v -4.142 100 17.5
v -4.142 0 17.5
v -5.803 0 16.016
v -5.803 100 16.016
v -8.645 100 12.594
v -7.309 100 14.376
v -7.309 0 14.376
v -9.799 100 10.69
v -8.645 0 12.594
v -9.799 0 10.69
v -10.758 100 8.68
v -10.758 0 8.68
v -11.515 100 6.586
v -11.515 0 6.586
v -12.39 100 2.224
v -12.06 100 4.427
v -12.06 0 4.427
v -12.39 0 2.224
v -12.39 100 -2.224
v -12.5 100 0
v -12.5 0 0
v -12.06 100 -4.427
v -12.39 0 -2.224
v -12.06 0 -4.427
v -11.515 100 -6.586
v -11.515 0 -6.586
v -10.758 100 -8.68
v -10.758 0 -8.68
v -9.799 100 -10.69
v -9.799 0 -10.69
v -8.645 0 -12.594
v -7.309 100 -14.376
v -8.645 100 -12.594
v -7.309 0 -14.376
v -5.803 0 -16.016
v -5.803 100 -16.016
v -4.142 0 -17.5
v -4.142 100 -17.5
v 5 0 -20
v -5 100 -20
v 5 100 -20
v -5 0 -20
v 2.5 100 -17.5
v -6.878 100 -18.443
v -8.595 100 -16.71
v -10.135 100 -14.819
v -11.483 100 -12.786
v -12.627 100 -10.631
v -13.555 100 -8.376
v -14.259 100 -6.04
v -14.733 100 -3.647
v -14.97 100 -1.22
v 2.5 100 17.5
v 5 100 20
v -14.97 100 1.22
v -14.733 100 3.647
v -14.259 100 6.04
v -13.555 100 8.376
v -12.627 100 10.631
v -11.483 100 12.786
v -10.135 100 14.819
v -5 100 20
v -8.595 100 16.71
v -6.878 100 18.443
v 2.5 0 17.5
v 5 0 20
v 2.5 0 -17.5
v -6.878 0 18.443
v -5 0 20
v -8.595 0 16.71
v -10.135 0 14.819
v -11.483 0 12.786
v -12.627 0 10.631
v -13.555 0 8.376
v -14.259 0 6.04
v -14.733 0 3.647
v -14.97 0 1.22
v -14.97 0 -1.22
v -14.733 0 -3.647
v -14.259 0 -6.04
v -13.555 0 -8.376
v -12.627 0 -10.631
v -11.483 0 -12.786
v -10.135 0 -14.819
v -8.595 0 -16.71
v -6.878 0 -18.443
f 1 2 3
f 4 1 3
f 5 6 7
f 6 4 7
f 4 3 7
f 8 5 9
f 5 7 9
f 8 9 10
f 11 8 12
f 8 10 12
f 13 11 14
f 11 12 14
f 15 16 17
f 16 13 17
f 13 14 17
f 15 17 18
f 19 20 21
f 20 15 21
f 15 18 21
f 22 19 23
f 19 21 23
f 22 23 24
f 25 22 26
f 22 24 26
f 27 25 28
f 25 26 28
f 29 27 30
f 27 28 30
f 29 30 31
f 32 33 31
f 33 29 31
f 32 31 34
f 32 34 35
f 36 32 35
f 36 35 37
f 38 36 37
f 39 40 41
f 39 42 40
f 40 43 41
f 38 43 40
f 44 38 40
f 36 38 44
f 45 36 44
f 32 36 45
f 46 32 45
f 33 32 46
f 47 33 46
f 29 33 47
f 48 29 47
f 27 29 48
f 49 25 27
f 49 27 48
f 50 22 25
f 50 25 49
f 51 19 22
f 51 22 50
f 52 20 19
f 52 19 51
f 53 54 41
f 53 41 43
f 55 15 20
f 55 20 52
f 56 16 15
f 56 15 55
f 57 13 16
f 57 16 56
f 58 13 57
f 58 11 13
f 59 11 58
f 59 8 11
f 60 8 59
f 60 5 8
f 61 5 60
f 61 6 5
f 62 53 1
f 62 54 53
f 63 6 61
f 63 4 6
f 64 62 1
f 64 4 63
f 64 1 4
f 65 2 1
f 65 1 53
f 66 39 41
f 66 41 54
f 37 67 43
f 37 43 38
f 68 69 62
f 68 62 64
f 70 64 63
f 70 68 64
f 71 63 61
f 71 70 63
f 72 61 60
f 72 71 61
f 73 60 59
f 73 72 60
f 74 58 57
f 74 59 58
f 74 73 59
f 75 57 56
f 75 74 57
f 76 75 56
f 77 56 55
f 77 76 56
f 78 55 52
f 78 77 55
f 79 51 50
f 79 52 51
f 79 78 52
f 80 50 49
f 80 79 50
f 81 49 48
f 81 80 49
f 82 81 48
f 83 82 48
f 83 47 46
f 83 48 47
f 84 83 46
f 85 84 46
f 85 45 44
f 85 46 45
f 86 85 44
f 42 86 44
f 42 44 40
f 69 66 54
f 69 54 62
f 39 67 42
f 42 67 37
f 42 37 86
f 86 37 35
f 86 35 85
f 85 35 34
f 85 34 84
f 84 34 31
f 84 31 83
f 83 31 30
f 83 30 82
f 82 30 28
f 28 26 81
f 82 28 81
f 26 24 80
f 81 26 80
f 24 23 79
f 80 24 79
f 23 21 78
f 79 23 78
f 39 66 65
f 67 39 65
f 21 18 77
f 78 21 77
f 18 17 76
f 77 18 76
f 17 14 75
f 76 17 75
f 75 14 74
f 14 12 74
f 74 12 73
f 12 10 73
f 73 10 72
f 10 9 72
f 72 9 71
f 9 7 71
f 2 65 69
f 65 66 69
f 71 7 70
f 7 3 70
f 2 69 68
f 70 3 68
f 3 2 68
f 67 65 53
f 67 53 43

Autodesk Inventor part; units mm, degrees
ref_plane "YZ Plane" through (0, 0, 0) normal (1, 0, 0) x (0, 1, 0)
ref_plane "XZ Plane" through (0, 0, 0) normal (0, 1, 0) x (-1, 0, 0)
ref_plane "XY Plane" through (0, 0, 0) normal (0, 0, 1) x (1, 0, 0)
sketch "Sketch1" plane through (0, 0, 0) normal (0, 1, 0) x (-1, 0, 0)
  line L0 (-5, 20) -> (5, 20)
  line L1 (5, 20) -> (5, -20) construction
  line L2 (5, -20) -> (-5, -20)
  line L3 (-5, -20) -> (-5, 20)
  line L4 (-5, 20) -> (5, -20) construction
  line L5 (5, 20) -> (-5, -20) construction
  arc A0 (5, -20) -> (5, 20) centre (-10, 0) ccw
  line L6 (-2.5, -17.5) -> (4.1421, -17.5)
  arc A1 (4.1421, -17.5) -> (4.1421, 17.5) centre (-10, 0) ccw
  line L7 (4.1421, 17.5) -> (-2.5, 17.5)
  line L8 (-2.5, 17.5) -> (-2.5, -17.5)
  point P0 (0, 0)
  dimension "d0" = 25
  dimension "d1" = 10
  dimension "d3" = 40
  dimension "d7" = 2.5
extrude "Extrusion1" add sketch "Sketch1" along normal blind 100
properties part number "Sanding Block"
